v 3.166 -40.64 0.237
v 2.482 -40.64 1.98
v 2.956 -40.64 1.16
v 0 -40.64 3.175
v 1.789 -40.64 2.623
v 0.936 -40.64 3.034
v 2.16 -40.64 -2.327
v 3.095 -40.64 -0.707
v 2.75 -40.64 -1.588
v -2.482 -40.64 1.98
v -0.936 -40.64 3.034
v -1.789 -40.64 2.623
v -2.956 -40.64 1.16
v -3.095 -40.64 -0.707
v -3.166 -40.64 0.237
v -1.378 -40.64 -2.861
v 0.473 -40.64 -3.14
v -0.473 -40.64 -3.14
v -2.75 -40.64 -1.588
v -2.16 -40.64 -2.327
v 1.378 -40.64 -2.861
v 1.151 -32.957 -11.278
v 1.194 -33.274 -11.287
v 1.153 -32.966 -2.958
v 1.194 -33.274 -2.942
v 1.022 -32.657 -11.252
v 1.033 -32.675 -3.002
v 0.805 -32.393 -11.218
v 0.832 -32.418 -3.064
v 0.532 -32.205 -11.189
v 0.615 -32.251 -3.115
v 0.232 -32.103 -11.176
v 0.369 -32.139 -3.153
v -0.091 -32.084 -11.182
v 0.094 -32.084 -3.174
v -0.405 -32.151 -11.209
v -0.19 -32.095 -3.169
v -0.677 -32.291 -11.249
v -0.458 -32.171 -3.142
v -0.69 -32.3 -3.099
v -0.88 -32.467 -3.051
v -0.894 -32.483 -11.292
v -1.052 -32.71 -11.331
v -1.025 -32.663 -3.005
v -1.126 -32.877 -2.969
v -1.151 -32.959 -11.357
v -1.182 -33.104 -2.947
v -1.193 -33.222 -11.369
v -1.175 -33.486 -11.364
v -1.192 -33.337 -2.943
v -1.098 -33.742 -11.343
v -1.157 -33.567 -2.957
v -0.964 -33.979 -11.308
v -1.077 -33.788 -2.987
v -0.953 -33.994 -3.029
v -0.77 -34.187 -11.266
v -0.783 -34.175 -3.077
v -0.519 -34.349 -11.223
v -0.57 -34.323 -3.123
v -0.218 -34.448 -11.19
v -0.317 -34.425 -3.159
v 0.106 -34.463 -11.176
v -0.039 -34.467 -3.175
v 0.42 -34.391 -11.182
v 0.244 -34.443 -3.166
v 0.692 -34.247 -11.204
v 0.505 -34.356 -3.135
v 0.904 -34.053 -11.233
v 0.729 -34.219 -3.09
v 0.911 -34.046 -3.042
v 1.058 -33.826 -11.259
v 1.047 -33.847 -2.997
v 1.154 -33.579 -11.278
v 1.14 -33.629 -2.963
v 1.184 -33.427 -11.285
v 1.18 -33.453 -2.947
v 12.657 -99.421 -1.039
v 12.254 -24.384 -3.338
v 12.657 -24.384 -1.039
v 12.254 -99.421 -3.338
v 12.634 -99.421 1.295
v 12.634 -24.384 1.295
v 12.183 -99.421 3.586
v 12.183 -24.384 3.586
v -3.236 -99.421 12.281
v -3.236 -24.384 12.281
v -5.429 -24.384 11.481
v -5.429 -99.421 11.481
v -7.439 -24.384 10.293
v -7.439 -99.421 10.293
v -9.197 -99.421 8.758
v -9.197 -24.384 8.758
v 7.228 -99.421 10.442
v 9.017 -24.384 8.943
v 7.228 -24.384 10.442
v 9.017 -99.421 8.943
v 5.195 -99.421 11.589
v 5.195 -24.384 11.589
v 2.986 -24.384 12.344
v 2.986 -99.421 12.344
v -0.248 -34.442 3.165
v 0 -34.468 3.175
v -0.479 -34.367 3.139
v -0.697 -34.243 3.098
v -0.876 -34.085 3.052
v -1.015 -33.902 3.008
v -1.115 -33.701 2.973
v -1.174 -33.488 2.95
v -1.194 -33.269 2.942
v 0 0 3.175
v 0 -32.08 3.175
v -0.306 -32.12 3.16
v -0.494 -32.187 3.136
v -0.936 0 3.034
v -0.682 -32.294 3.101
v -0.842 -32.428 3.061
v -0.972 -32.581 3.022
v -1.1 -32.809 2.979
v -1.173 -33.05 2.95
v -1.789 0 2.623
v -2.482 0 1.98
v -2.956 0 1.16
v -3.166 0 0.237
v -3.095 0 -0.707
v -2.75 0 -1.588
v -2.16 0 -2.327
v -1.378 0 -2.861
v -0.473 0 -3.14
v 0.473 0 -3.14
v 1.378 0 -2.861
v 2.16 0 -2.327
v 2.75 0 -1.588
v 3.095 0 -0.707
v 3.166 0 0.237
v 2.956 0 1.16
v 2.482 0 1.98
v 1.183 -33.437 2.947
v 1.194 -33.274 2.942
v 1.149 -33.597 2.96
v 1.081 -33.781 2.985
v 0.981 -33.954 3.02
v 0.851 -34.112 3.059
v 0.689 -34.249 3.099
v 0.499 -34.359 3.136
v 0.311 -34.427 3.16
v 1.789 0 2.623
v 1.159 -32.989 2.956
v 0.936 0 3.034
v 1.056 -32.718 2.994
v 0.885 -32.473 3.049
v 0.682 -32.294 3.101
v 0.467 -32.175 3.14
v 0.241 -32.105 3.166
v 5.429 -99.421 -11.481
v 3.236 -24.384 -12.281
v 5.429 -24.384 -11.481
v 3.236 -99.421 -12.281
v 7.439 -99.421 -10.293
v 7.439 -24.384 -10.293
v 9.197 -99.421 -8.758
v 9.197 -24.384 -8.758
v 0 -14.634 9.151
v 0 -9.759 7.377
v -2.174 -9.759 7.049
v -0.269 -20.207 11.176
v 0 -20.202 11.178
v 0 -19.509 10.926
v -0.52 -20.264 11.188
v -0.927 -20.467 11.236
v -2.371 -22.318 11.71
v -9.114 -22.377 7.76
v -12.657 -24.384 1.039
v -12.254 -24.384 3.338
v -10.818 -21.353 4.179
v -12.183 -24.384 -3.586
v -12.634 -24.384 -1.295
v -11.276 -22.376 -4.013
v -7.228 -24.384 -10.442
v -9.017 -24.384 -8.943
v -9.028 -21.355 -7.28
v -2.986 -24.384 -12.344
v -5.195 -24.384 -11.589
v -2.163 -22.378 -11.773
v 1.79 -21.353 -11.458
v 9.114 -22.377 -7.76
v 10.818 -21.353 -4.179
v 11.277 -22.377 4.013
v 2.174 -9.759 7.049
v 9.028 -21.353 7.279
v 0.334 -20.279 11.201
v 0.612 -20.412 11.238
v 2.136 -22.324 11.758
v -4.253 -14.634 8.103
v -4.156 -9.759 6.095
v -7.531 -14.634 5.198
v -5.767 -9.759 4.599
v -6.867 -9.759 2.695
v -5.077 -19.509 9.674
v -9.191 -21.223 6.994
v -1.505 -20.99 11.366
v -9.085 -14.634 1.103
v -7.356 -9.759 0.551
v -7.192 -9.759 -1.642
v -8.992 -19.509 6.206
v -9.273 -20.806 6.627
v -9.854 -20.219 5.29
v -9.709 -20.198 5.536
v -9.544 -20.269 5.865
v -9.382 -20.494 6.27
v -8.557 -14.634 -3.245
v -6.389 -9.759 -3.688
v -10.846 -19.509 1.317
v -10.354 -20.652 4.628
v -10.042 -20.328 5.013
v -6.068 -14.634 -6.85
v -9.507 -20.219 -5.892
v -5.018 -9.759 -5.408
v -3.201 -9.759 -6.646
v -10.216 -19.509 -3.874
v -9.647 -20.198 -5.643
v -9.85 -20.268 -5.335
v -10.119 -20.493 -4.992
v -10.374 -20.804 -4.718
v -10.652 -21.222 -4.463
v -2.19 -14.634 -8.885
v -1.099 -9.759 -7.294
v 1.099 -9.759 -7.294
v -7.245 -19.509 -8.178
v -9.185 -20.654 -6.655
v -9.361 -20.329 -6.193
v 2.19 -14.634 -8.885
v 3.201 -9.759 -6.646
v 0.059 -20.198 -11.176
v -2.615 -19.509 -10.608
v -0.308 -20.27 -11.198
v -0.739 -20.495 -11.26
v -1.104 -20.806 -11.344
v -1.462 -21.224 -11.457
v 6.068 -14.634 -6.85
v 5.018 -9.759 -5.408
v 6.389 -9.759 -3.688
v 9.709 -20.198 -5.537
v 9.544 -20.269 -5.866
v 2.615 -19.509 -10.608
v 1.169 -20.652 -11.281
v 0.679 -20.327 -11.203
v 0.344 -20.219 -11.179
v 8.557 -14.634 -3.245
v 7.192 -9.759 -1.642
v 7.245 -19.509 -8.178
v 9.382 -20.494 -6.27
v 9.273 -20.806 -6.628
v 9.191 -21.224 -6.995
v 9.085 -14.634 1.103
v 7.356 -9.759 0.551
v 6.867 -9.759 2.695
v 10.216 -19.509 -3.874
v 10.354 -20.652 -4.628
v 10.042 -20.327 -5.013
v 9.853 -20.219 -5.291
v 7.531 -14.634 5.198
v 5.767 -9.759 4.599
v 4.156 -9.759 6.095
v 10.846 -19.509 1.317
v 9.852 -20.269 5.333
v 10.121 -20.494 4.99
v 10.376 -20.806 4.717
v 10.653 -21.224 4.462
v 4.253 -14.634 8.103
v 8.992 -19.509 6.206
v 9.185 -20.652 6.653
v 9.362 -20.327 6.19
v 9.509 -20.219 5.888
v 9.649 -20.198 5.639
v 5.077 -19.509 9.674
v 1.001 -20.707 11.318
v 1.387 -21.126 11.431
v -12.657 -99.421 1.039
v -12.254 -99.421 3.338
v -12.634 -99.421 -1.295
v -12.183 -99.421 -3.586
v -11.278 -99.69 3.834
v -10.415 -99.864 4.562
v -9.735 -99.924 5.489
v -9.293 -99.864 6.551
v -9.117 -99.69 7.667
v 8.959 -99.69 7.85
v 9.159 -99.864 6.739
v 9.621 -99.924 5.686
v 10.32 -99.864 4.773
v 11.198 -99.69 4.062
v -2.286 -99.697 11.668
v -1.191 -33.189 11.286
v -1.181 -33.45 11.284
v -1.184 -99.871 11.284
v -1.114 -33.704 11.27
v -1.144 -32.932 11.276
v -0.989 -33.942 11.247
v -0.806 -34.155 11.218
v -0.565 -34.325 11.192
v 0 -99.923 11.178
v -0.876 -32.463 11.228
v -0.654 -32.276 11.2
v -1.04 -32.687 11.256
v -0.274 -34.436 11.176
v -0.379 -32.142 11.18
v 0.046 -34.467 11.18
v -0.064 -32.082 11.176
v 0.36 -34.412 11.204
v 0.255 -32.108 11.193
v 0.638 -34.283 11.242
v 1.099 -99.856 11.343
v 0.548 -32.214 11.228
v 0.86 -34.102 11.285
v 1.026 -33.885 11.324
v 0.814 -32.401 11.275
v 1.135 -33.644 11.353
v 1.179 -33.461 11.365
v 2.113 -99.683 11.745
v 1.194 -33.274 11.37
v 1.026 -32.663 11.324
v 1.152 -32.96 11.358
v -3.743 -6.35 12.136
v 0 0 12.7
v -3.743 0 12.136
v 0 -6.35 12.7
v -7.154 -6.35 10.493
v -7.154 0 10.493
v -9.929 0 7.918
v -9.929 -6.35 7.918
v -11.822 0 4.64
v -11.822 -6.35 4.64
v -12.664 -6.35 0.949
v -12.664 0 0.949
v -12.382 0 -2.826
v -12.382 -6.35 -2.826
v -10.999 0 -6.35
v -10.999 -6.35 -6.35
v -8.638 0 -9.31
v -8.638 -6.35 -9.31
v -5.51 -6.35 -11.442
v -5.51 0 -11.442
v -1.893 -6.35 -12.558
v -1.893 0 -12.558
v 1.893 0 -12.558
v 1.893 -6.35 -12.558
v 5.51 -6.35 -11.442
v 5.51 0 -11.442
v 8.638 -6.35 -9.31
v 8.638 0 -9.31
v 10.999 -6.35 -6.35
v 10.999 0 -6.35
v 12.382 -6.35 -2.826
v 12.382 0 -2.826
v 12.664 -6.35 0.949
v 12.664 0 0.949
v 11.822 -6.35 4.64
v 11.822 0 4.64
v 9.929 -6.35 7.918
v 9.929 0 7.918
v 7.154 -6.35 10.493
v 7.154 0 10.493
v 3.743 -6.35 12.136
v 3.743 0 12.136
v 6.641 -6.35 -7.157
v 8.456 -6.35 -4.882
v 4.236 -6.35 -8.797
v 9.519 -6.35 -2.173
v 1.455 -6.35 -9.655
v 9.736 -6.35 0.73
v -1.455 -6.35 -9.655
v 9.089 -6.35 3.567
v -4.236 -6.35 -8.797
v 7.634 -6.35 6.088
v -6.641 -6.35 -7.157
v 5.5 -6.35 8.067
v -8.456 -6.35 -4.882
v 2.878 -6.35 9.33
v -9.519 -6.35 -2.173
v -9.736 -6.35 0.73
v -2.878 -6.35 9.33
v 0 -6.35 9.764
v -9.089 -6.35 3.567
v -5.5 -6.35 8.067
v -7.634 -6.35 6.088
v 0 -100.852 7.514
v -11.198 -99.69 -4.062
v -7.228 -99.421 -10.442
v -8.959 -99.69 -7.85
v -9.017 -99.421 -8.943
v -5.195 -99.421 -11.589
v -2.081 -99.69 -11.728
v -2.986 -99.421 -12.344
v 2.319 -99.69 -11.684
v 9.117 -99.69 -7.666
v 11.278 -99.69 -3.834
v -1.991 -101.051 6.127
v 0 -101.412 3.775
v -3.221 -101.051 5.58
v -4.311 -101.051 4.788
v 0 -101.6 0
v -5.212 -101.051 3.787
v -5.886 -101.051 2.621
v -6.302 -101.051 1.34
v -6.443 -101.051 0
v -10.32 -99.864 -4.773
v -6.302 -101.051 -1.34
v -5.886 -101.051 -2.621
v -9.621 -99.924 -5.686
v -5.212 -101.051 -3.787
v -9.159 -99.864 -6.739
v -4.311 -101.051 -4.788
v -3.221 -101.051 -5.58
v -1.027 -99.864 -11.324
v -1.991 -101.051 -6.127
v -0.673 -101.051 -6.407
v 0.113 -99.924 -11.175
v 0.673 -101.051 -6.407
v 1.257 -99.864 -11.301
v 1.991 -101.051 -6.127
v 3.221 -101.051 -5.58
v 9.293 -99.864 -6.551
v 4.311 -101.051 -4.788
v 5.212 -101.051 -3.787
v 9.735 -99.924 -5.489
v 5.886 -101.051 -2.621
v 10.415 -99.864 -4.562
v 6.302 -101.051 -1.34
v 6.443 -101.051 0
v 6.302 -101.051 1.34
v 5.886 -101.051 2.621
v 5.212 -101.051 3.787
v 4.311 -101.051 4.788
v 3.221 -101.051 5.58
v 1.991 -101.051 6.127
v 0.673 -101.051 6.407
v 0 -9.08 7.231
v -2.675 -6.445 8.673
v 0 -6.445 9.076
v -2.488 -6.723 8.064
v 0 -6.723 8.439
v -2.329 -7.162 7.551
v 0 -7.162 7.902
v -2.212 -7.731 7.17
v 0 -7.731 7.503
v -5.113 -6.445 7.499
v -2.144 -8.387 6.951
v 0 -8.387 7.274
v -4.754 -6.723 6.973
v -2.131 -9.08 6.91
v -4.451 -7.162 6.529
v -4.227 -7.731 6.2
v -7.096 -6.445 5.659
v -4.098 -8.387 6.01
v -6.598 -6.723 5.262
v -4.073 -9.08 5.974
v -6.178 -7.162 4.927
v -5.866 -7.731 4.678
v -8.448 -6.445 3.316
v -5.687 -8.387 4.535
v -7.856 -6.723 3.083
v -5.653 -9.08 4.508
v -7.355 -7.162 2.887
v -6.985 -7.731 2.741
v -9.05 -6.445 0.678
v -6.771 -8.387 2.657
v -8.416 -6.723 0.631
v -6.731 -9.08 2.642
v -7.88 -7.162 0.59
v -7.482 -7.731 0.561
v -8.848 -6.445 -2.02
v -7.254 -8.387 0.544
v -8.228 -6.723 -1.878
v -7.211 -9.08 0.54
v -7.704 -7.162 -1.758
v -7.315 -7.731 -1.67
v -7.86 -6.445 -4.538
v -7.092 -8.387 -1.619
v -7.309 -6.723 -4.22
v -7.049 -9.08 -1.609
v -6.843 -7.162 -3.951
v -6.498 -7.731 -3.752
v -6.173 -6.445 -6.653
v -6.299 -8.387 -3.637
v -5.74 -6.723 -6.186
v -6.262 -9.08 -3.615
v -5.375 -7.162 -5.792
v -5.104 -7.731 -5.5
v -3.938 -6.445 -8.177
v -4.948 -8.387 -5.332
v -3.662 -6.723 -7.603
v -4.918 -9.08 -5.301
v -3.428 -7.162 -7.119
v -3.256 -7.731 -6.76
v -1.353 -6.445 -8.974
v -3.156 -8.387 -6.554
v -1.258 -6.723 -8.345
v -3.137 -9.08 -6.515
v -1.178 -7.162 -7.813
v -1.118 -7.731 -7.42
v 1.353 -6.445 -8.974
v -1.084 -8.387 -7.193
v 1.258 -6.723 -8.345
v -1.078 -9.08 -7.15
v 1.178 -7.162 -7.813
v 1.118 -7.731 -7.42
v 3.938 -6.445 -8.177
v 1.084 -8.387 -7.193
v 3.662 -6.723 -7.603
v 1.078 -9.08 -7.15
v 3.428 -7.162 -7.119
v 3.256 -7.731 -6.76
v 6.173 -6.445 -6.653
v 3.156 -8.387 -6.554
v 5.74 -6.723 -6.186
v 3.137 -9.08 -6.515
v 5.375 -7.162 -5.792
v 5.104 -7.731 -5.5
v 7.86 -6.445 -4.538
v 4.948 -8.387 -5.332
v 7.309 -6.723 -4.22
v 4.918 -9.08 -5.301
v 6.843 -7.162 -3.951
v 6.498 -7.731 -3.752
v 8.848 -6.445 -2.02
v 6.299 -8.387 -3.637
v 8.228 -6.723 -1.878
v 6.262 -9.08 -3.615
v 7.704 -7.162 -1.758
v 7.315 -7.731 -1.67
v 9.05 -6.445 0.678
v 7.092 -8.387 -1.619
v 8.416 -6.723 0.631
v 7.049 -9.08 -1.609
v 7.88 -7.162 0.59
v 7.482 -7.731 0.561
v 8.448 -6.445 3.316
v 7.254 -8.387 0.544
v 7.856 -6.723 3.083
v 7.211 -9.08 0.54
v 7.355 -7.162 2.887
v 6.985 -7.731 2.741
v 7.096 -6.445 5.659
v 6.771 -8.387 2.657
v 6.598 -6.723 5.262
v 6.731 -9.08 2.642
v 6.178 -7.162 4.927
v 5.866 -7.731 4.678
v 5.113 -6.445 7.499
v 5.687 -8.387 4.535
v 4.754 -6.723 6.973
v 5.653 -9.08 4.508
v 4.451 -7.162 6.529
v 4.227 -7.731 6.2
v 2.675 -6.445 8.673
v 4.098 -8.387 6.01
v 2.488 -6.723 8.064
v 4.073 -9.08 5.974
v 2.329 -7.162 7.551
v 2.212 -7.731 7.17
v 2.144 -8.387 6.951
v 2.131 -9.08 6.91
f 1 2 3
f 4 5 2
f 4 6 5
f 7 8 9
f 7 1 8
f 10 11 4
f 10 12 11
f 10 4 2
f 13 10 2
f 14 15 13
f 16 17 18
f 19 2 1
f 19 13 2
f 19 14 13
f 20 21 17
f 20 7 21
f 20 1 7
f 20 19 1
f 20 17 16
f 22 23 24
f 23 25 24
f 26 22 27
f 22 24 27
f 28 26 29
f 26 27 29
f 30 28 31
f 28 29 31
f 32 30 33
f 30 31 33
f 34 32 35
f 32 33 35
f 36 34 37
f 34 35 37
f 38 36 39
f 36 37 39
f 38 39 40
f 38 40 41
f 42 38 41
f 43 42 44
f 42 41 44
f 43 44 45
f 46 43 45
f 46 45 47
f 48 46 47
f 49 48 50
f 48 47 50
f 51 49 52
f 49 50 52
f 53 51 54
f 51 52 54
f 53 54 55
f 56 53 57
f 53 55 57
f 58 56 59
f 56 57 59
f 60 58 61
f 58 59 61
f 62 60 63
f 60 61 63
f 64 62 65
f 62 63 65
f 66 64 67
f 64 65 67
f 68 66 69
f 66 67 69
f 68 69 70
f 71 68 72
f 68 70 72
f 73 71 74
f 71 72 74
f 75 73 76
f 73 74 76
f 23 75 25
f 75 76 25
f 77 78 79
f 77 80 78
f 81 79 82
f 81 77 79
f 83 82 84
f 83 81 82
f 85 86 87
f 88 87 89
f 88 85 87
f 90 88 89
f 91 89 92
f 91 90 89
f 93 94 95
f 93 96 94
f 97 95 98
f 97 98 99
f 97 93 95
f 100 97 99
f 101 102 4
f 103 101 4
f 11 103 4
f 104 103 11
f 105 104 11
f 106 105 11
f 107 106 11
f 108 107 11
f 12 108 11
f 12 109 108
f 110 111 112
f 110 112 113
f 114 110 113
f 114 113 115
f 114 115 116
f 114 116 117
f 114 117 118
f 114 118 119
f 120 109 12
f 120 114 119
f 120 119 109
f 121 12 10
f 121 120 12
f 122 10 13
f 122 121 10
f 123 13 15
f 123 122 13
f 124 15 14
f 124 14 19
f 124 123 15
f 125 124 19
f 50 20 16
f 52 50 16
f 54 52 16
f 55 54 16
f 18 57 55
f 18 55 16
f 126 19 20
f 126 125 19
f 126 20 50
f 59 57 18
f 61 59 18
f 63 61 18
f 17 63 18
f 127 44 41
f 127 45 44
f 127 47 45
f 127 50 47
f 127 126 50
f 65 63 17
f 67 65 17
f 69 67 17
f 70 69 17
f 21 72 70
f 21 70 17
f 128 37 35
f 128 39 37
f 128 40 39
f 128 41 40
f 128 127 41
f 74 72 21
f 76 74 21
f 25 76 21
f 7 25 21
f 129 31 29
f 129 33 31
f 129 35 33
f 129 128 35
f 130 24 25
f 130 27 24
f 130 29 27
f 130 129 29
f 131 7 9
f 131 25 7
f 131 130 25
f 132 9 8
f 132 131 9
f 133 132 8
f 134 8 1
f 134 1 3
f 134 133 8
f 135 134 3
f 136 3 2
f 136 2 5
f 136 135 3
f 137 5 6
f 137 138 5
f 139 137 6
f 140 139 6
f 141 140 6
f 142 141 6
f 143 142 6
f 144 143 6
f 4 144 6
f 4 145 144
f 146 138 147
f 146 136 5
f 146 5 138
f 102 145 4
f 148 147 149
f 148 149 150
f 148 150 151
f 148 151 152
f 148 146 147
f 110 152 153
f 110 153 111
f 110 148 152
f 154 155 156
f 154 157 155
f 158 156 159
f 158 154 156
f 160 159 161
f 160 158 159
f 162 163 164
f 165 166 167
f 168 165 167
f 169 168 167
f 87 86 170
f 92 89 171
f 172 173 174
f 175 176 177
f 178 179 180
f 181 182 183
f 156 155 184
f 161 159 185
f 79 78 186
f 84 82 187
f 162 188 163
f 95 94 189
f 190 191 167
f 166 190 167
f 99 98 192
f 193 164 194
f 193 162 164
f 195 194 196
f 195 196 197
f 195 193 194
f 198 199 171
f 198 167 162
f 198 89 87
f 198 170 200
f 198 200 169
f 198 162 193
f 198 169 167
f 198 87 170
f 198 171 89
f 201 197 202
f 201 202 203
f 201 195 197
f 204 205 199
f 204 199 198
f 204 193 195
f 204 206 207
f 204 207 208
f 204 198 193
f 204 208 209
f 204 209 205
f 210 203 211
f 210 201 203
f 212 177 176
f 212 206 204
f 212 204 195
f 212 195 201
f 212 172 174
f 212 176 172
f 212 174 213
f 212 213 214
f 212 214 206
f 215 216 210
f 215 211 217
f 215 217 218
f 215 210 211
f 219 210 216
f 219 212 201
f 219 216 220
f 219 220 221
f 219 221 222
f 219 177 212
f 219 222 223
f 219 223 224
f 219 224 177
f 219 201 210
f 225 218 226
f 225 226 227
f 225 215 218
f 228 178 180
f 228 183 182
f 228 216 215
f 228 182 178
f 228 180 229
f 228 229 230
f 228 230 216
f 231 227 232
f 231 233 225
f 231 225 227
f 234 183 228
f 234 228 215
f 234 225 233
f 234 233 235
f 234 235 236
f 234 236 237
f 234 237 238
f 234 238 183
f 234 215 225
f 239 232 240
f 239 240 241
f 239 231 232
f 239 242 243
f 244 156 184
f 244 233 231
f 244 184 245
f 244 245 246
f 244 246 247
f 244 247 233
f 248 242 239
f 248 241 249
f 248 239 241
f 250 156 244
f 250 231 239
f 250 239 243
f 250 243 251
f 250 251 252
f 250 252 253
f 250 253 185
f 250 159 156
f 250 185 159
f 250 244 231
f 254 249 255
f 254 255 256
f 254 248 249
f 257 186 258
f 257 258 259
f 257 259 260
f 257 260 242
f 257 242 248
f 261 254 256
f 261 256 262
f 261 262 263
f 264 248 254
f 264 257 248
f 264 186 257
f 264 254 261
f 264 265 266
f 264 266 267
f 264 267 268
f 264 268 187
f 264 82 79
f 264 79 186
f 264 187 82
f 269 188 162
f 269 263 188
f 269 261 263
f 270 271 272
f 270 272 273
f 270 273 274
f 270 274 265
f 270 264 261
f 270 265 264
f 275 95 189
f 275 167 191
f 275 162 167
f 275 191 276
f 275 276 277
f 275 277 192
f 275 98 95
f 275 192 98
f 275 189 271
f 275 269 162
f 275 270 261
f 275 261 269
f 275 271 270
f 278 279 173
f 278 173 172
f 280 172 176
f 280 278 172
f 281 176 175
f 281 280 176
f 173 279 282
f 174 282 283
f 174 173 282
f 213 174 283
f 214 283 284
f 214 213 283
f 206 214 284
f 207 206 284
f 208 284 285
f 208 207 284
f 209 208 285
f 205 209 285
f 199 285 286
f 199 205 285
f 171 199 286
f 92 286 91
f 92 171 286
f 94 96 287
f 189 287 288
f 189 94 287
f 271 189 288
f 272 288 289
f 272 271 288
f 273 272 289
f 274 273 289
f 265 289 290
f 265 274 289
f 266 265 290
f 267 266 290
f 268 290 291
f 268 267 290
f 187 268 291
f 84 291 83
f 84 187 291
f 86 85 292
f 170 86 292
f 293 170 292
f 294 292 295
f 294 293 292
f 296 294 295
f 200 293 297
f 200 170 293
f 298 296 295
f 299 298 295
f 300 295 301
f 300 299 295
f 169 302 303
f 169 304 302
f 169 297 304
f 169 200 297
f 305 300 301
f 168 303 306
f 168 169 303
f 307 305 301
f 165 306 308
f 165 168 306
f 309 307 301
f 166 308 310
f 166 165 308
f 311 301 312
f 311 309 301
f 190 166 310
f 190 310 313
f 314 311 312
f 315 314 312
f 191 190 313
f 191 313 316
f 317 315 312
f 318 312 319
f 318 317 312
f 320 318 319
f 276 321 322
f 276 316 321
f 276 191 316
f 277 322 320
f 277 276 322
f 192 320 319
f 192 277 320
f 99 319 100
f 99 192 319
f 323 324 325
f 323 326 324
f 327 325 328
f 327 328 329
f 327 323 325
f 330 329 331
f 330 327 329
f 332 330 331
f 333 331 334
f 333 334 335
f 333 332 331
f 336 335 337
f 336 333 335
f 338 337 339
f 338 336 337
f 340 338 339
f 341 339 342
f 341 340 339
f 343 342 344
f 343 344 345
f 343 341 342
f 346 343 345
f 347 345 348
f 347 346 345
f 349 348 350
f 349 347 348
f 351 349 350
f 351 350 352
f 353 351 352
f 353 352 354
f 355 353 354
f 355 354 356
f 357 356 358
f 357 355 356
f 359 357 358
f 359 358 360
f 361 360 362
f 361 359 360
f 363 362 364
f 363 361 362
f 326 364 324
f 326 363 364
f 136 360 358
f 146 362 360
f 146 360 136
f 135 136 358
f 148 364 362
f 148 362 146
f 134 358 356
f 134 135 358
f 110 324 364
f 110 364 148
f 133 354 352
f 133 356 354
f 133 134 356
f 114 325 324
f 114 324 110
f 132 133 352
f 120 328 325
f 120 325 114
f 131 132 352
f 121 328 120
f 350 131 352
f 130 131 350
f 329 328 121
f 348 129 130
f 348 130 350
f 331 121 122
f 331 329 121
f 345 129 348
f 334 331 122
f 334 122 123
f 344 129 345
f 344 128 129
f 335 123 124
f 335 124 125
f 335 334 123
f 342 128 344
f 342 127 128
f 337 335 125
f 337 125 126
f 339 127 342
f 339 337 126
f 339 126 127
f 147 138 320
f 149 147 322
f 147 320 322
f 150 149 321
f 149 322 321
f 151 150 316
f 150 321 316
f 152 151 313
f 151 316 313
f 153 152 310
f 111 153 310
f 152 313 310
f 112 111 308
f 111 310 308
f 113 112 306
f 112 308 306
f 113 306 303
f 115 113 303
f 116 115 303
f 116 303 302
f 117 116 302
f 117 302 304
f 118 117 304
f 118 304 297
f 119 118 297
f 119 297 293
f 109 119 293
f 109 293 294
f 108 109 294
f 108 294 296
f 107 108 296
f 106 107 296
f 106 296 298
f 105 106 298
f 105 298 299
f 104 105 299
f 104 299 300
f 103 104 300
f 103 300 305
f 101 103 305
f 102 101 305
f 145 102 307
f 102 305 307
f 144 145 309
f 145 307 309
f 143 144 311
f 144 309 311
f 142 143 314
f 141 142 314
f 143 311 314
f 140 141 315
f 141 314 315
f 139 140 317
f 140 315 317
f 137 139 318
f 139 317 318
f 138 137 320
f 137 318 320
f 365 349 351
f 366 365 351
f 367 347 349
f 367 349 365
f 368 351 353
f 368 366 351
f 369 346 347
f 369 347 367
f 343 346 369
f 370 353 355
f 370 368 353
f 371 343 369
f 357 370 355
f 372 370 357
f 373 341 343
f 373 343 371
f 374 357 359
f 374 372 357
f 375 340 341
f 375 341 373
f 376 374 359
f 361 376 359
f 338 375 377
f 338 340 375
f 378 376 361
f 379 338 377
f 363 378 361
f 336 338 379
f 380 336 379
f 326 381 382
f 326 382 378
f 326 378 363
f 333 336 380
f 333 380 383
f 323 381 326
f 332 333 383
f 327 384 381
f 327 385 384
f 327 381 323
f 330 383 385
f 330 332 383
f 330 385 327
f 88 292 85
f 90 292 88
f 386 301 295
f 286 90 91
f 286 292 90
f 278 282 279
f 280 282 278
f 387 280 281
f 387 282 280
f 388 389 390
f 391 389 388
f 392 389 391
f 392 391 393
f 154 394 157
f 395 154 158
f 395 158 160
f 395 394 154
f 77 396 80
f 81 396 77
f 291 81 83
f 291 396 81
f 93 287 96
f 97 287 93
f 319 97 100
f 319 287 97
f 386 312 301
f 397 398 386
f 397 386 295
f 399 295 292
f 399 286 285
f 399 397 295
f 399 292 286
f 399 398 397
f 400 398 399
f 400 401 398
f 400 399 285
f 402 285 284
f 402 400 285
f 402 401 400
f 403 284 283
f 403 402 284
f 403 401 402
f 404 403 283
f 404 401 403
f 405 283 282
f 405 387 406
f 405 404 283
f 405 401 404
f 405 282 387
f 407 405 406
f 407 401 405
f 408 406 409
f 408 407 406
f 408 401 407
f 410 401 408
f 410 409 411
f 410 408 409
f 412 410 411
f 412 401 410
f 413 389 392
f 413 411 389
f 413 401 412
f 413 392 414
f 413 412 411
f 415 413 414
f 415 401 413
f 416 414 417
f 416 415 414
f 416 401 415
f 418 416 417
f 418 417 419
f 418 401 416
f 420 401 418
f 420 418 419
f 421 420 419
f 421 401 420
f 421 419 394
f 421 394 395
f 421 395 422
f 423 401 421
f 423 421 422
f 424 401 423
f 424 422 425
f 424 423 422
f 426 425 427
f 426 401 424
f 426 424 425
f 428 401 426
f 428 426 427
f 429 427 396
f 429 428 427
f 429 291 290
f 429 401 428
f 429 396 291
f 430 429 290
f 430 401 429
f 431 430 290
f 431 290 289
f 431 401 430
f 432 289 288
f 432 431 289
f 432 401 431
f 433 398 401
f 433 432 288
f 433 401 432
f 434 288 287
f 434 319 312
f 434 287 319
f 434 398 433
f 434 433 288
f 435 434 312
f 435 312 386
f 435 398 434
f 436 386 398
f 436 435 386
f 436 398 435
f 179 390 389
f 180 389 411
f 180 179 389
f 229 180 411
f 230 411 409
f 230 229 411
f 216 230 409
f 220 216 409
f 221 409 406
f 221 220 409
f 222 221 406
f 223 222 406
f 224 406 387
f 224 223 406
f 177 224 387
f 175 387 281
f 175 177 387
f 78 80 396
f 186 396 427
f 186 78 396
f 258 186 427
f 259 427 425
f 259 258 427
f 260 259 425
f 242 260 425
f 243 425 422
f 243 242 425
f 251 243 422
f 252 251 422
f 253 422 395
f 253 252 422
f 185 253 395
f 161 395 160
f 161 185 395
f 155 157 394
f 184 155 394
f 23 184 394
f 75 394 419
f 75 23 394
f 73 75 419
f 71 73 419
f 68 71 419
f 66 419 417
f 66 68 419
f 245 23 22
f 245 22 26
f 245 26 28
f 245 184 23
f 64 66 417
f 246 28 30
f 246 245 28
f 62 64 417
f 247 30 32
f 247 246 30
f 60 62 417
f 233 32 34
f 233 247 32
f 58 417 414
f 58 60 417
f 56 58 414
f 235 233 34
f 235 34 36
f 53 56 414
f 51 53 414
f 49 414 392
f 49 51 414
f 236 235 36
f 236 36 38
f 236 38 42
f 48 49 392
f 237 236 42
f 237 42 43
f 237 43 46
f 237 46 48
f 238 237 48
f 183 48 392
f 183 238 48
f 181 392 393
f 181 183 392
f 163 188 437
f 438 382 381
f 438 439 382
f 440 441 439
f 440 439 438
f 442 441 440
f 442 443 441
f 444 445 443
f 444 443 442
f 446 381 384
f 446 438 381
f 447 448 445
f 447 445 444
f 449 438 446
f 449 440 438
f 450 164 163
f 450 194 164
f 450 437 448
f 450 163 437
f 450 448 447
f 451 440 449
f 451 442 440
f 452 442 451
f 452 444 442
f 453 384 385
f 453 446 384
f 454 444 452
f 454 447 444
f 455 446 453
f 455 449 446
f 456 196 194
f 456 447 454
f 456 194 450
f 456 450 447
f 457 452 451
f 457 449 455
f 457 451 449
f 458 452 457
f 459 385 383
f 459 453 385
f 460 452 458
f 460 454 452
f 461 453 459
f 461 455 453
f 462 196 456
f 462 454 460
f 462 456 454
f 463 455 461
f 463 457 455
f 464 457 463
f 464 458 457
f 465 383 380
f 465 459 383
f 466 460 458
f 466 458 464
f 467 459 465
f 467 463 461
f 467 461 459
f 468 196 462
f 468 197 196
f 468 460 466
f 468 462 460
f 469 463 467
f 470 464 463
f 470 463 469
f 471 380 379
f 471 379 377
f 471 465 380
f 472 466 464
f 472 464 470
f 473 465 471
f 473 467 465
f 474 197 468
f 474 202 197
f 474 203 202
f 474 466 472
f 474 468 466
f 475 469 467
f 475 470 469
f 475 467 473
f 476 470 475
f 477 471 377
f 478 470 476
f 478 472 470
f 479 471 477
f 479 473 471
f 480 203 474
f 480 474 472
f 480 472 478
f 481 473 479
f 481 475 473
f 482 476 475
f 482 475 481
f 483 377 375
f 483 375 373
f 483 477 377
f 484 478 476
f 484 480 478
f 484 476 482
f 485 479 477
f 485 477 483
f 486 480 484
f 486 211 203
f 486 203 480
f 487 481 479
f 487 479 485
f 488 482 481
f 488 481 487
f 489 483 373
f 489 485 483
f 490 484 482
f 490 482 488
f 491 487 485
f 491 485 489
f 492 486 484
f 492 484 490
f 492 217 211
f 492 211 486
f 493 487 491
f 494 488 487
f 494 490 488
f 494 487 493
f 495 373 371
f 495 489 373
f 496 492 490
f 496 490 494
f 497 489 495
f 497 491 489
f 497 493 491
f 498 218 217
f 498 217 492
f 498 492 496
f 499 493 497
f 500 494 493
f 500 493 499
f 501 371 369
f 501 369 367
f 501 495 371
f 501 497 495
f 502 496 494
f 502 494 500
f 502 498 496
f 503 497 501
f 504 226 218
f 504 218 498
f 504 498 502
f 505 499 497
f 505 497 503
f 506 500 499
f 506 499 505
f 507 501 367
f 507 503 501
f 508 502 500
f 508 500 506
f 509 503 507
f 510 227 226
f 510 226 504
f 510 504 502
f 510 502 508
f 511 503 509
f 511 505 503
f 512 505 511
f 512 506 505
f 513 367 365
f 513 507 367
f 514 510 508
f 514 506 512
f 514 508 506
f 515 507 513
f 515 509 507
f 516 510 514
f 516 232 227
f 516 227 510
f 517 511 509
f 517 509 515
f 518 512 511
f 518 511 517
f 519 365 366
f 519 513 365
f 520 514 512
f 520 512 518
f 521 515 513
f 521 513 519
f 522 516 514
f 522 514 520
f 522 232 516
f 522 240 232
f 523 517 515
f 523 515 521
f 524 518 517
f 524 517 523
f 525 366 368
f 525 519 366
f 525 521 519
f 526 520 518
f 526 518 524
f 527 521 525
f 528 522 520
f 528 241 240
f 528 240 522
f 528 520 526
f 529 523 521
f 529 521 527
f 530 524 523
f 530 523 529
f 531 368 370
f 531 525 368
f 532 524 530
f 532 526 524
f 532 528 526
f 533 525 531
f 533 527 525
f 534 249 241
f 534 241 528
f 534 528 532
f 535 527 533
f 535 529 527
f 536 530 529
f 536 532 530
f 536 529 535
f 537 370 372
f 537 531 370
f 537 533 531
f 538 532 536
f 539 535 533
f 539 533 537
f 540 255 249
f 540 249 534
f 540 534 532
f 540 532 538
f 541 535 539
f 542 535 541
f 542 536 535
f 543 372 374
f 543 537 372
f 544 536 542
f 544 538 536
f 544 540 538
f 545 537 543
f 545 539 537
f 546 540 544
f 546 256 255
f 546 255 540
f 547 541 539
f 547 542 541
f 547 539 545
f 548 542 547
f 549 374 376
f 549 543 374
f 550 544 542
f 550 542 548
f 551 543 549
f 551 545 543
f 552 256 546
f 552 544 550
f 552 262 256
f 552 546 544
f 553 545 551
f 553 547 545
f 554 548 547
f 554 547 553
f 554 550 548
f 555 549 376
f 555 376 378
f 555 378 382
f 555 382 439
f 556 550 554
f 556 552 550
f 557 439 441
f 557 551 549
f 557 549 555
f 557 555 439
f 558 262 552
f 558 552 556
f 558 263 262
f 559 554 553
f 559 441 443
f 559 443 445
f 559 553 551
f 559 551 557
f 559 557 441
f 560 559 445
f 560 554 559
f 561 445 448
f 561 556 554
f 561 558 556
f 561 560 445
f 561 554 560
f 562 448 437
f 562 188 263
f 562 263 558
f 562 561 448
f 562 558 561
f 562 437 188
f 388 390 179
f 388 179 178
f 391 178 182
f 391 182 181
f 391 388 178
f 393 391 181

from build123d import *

# Parameters (mm, degrees)
F3_START = 7.62
F2_R     = 4.826
F3_DEPTH = 93.981
F4_R     = 1.1938
F5_DEPTH = 12.7


with BuildPart() as f1:
    # F0 (on Right) → F1 (revolve)
    with BuildSketch(Plane.YZ):
        with BuildLine():
            Line((-40.64, 3.175), (0, 3.175))
            Line((0, 3.175), (0, 12.7))
            Line((0, 12.7), (-6.35, 12.7))
            Line((-6.35, 12.7), (-6.35, 9.7636567324))
            ThreePointArc((-6.35, 9.7636567324), (-7.4331158517, 7.6830105399), (-9.758731164, 7.3768374756))
            Line((-9.758731164, 7.3768374756), (-24.384, 12.7))
            Line((-24.384, 12.7), (-99.4210244843, 12.7))
            ThreePointArc((-99.4210244843, 12.7), (-101.0513051228, 6.4427853895), (-101.6, 0))
            Line((-101.6, 0), (-40.64, 0))
            Line((-40.64, 0), (-40.64, 3.175))
        make_face()
    revolve(axis=Axis((0, -71.12, 0), (0, -1, 0)))

    # F2 (on Front) → F3 (cut)
    with BuildSketch(Plane.XZ.offset(F3_START)):
        with Locations((-0.1624401561, 16.0011754942)):
            Circle(F2_R)
        with Locations((13.7762043903, 8.1412650489)):
            Circle(F2_R)
        with Locations((13.9386445464, -7.8599104453)):
            Circle(F2_R)
        with Locations((0.1624401561, -16.0011754942)):
            Circle(F2_R)
        with Locations((-13.7762043903, -8.1412650489)):
            Circle(F2_R)
        with Locations((-13.9386445464, 7.8599104453)):
            Circle(F2_R)
    extrude(amount=F3_DEPTH, mode=Mode.SUBTRACT)

    # F4 (on Top) → F5 (cut, symmetric)
    with BuildSketch(Plane.XY):
        with Locations((0, -33.274)):
            Circle(F4_R)
    extrude(amount=F5_DEPTH, both=True, mode=Mode.SUBTRACT)


solid = f1.part
